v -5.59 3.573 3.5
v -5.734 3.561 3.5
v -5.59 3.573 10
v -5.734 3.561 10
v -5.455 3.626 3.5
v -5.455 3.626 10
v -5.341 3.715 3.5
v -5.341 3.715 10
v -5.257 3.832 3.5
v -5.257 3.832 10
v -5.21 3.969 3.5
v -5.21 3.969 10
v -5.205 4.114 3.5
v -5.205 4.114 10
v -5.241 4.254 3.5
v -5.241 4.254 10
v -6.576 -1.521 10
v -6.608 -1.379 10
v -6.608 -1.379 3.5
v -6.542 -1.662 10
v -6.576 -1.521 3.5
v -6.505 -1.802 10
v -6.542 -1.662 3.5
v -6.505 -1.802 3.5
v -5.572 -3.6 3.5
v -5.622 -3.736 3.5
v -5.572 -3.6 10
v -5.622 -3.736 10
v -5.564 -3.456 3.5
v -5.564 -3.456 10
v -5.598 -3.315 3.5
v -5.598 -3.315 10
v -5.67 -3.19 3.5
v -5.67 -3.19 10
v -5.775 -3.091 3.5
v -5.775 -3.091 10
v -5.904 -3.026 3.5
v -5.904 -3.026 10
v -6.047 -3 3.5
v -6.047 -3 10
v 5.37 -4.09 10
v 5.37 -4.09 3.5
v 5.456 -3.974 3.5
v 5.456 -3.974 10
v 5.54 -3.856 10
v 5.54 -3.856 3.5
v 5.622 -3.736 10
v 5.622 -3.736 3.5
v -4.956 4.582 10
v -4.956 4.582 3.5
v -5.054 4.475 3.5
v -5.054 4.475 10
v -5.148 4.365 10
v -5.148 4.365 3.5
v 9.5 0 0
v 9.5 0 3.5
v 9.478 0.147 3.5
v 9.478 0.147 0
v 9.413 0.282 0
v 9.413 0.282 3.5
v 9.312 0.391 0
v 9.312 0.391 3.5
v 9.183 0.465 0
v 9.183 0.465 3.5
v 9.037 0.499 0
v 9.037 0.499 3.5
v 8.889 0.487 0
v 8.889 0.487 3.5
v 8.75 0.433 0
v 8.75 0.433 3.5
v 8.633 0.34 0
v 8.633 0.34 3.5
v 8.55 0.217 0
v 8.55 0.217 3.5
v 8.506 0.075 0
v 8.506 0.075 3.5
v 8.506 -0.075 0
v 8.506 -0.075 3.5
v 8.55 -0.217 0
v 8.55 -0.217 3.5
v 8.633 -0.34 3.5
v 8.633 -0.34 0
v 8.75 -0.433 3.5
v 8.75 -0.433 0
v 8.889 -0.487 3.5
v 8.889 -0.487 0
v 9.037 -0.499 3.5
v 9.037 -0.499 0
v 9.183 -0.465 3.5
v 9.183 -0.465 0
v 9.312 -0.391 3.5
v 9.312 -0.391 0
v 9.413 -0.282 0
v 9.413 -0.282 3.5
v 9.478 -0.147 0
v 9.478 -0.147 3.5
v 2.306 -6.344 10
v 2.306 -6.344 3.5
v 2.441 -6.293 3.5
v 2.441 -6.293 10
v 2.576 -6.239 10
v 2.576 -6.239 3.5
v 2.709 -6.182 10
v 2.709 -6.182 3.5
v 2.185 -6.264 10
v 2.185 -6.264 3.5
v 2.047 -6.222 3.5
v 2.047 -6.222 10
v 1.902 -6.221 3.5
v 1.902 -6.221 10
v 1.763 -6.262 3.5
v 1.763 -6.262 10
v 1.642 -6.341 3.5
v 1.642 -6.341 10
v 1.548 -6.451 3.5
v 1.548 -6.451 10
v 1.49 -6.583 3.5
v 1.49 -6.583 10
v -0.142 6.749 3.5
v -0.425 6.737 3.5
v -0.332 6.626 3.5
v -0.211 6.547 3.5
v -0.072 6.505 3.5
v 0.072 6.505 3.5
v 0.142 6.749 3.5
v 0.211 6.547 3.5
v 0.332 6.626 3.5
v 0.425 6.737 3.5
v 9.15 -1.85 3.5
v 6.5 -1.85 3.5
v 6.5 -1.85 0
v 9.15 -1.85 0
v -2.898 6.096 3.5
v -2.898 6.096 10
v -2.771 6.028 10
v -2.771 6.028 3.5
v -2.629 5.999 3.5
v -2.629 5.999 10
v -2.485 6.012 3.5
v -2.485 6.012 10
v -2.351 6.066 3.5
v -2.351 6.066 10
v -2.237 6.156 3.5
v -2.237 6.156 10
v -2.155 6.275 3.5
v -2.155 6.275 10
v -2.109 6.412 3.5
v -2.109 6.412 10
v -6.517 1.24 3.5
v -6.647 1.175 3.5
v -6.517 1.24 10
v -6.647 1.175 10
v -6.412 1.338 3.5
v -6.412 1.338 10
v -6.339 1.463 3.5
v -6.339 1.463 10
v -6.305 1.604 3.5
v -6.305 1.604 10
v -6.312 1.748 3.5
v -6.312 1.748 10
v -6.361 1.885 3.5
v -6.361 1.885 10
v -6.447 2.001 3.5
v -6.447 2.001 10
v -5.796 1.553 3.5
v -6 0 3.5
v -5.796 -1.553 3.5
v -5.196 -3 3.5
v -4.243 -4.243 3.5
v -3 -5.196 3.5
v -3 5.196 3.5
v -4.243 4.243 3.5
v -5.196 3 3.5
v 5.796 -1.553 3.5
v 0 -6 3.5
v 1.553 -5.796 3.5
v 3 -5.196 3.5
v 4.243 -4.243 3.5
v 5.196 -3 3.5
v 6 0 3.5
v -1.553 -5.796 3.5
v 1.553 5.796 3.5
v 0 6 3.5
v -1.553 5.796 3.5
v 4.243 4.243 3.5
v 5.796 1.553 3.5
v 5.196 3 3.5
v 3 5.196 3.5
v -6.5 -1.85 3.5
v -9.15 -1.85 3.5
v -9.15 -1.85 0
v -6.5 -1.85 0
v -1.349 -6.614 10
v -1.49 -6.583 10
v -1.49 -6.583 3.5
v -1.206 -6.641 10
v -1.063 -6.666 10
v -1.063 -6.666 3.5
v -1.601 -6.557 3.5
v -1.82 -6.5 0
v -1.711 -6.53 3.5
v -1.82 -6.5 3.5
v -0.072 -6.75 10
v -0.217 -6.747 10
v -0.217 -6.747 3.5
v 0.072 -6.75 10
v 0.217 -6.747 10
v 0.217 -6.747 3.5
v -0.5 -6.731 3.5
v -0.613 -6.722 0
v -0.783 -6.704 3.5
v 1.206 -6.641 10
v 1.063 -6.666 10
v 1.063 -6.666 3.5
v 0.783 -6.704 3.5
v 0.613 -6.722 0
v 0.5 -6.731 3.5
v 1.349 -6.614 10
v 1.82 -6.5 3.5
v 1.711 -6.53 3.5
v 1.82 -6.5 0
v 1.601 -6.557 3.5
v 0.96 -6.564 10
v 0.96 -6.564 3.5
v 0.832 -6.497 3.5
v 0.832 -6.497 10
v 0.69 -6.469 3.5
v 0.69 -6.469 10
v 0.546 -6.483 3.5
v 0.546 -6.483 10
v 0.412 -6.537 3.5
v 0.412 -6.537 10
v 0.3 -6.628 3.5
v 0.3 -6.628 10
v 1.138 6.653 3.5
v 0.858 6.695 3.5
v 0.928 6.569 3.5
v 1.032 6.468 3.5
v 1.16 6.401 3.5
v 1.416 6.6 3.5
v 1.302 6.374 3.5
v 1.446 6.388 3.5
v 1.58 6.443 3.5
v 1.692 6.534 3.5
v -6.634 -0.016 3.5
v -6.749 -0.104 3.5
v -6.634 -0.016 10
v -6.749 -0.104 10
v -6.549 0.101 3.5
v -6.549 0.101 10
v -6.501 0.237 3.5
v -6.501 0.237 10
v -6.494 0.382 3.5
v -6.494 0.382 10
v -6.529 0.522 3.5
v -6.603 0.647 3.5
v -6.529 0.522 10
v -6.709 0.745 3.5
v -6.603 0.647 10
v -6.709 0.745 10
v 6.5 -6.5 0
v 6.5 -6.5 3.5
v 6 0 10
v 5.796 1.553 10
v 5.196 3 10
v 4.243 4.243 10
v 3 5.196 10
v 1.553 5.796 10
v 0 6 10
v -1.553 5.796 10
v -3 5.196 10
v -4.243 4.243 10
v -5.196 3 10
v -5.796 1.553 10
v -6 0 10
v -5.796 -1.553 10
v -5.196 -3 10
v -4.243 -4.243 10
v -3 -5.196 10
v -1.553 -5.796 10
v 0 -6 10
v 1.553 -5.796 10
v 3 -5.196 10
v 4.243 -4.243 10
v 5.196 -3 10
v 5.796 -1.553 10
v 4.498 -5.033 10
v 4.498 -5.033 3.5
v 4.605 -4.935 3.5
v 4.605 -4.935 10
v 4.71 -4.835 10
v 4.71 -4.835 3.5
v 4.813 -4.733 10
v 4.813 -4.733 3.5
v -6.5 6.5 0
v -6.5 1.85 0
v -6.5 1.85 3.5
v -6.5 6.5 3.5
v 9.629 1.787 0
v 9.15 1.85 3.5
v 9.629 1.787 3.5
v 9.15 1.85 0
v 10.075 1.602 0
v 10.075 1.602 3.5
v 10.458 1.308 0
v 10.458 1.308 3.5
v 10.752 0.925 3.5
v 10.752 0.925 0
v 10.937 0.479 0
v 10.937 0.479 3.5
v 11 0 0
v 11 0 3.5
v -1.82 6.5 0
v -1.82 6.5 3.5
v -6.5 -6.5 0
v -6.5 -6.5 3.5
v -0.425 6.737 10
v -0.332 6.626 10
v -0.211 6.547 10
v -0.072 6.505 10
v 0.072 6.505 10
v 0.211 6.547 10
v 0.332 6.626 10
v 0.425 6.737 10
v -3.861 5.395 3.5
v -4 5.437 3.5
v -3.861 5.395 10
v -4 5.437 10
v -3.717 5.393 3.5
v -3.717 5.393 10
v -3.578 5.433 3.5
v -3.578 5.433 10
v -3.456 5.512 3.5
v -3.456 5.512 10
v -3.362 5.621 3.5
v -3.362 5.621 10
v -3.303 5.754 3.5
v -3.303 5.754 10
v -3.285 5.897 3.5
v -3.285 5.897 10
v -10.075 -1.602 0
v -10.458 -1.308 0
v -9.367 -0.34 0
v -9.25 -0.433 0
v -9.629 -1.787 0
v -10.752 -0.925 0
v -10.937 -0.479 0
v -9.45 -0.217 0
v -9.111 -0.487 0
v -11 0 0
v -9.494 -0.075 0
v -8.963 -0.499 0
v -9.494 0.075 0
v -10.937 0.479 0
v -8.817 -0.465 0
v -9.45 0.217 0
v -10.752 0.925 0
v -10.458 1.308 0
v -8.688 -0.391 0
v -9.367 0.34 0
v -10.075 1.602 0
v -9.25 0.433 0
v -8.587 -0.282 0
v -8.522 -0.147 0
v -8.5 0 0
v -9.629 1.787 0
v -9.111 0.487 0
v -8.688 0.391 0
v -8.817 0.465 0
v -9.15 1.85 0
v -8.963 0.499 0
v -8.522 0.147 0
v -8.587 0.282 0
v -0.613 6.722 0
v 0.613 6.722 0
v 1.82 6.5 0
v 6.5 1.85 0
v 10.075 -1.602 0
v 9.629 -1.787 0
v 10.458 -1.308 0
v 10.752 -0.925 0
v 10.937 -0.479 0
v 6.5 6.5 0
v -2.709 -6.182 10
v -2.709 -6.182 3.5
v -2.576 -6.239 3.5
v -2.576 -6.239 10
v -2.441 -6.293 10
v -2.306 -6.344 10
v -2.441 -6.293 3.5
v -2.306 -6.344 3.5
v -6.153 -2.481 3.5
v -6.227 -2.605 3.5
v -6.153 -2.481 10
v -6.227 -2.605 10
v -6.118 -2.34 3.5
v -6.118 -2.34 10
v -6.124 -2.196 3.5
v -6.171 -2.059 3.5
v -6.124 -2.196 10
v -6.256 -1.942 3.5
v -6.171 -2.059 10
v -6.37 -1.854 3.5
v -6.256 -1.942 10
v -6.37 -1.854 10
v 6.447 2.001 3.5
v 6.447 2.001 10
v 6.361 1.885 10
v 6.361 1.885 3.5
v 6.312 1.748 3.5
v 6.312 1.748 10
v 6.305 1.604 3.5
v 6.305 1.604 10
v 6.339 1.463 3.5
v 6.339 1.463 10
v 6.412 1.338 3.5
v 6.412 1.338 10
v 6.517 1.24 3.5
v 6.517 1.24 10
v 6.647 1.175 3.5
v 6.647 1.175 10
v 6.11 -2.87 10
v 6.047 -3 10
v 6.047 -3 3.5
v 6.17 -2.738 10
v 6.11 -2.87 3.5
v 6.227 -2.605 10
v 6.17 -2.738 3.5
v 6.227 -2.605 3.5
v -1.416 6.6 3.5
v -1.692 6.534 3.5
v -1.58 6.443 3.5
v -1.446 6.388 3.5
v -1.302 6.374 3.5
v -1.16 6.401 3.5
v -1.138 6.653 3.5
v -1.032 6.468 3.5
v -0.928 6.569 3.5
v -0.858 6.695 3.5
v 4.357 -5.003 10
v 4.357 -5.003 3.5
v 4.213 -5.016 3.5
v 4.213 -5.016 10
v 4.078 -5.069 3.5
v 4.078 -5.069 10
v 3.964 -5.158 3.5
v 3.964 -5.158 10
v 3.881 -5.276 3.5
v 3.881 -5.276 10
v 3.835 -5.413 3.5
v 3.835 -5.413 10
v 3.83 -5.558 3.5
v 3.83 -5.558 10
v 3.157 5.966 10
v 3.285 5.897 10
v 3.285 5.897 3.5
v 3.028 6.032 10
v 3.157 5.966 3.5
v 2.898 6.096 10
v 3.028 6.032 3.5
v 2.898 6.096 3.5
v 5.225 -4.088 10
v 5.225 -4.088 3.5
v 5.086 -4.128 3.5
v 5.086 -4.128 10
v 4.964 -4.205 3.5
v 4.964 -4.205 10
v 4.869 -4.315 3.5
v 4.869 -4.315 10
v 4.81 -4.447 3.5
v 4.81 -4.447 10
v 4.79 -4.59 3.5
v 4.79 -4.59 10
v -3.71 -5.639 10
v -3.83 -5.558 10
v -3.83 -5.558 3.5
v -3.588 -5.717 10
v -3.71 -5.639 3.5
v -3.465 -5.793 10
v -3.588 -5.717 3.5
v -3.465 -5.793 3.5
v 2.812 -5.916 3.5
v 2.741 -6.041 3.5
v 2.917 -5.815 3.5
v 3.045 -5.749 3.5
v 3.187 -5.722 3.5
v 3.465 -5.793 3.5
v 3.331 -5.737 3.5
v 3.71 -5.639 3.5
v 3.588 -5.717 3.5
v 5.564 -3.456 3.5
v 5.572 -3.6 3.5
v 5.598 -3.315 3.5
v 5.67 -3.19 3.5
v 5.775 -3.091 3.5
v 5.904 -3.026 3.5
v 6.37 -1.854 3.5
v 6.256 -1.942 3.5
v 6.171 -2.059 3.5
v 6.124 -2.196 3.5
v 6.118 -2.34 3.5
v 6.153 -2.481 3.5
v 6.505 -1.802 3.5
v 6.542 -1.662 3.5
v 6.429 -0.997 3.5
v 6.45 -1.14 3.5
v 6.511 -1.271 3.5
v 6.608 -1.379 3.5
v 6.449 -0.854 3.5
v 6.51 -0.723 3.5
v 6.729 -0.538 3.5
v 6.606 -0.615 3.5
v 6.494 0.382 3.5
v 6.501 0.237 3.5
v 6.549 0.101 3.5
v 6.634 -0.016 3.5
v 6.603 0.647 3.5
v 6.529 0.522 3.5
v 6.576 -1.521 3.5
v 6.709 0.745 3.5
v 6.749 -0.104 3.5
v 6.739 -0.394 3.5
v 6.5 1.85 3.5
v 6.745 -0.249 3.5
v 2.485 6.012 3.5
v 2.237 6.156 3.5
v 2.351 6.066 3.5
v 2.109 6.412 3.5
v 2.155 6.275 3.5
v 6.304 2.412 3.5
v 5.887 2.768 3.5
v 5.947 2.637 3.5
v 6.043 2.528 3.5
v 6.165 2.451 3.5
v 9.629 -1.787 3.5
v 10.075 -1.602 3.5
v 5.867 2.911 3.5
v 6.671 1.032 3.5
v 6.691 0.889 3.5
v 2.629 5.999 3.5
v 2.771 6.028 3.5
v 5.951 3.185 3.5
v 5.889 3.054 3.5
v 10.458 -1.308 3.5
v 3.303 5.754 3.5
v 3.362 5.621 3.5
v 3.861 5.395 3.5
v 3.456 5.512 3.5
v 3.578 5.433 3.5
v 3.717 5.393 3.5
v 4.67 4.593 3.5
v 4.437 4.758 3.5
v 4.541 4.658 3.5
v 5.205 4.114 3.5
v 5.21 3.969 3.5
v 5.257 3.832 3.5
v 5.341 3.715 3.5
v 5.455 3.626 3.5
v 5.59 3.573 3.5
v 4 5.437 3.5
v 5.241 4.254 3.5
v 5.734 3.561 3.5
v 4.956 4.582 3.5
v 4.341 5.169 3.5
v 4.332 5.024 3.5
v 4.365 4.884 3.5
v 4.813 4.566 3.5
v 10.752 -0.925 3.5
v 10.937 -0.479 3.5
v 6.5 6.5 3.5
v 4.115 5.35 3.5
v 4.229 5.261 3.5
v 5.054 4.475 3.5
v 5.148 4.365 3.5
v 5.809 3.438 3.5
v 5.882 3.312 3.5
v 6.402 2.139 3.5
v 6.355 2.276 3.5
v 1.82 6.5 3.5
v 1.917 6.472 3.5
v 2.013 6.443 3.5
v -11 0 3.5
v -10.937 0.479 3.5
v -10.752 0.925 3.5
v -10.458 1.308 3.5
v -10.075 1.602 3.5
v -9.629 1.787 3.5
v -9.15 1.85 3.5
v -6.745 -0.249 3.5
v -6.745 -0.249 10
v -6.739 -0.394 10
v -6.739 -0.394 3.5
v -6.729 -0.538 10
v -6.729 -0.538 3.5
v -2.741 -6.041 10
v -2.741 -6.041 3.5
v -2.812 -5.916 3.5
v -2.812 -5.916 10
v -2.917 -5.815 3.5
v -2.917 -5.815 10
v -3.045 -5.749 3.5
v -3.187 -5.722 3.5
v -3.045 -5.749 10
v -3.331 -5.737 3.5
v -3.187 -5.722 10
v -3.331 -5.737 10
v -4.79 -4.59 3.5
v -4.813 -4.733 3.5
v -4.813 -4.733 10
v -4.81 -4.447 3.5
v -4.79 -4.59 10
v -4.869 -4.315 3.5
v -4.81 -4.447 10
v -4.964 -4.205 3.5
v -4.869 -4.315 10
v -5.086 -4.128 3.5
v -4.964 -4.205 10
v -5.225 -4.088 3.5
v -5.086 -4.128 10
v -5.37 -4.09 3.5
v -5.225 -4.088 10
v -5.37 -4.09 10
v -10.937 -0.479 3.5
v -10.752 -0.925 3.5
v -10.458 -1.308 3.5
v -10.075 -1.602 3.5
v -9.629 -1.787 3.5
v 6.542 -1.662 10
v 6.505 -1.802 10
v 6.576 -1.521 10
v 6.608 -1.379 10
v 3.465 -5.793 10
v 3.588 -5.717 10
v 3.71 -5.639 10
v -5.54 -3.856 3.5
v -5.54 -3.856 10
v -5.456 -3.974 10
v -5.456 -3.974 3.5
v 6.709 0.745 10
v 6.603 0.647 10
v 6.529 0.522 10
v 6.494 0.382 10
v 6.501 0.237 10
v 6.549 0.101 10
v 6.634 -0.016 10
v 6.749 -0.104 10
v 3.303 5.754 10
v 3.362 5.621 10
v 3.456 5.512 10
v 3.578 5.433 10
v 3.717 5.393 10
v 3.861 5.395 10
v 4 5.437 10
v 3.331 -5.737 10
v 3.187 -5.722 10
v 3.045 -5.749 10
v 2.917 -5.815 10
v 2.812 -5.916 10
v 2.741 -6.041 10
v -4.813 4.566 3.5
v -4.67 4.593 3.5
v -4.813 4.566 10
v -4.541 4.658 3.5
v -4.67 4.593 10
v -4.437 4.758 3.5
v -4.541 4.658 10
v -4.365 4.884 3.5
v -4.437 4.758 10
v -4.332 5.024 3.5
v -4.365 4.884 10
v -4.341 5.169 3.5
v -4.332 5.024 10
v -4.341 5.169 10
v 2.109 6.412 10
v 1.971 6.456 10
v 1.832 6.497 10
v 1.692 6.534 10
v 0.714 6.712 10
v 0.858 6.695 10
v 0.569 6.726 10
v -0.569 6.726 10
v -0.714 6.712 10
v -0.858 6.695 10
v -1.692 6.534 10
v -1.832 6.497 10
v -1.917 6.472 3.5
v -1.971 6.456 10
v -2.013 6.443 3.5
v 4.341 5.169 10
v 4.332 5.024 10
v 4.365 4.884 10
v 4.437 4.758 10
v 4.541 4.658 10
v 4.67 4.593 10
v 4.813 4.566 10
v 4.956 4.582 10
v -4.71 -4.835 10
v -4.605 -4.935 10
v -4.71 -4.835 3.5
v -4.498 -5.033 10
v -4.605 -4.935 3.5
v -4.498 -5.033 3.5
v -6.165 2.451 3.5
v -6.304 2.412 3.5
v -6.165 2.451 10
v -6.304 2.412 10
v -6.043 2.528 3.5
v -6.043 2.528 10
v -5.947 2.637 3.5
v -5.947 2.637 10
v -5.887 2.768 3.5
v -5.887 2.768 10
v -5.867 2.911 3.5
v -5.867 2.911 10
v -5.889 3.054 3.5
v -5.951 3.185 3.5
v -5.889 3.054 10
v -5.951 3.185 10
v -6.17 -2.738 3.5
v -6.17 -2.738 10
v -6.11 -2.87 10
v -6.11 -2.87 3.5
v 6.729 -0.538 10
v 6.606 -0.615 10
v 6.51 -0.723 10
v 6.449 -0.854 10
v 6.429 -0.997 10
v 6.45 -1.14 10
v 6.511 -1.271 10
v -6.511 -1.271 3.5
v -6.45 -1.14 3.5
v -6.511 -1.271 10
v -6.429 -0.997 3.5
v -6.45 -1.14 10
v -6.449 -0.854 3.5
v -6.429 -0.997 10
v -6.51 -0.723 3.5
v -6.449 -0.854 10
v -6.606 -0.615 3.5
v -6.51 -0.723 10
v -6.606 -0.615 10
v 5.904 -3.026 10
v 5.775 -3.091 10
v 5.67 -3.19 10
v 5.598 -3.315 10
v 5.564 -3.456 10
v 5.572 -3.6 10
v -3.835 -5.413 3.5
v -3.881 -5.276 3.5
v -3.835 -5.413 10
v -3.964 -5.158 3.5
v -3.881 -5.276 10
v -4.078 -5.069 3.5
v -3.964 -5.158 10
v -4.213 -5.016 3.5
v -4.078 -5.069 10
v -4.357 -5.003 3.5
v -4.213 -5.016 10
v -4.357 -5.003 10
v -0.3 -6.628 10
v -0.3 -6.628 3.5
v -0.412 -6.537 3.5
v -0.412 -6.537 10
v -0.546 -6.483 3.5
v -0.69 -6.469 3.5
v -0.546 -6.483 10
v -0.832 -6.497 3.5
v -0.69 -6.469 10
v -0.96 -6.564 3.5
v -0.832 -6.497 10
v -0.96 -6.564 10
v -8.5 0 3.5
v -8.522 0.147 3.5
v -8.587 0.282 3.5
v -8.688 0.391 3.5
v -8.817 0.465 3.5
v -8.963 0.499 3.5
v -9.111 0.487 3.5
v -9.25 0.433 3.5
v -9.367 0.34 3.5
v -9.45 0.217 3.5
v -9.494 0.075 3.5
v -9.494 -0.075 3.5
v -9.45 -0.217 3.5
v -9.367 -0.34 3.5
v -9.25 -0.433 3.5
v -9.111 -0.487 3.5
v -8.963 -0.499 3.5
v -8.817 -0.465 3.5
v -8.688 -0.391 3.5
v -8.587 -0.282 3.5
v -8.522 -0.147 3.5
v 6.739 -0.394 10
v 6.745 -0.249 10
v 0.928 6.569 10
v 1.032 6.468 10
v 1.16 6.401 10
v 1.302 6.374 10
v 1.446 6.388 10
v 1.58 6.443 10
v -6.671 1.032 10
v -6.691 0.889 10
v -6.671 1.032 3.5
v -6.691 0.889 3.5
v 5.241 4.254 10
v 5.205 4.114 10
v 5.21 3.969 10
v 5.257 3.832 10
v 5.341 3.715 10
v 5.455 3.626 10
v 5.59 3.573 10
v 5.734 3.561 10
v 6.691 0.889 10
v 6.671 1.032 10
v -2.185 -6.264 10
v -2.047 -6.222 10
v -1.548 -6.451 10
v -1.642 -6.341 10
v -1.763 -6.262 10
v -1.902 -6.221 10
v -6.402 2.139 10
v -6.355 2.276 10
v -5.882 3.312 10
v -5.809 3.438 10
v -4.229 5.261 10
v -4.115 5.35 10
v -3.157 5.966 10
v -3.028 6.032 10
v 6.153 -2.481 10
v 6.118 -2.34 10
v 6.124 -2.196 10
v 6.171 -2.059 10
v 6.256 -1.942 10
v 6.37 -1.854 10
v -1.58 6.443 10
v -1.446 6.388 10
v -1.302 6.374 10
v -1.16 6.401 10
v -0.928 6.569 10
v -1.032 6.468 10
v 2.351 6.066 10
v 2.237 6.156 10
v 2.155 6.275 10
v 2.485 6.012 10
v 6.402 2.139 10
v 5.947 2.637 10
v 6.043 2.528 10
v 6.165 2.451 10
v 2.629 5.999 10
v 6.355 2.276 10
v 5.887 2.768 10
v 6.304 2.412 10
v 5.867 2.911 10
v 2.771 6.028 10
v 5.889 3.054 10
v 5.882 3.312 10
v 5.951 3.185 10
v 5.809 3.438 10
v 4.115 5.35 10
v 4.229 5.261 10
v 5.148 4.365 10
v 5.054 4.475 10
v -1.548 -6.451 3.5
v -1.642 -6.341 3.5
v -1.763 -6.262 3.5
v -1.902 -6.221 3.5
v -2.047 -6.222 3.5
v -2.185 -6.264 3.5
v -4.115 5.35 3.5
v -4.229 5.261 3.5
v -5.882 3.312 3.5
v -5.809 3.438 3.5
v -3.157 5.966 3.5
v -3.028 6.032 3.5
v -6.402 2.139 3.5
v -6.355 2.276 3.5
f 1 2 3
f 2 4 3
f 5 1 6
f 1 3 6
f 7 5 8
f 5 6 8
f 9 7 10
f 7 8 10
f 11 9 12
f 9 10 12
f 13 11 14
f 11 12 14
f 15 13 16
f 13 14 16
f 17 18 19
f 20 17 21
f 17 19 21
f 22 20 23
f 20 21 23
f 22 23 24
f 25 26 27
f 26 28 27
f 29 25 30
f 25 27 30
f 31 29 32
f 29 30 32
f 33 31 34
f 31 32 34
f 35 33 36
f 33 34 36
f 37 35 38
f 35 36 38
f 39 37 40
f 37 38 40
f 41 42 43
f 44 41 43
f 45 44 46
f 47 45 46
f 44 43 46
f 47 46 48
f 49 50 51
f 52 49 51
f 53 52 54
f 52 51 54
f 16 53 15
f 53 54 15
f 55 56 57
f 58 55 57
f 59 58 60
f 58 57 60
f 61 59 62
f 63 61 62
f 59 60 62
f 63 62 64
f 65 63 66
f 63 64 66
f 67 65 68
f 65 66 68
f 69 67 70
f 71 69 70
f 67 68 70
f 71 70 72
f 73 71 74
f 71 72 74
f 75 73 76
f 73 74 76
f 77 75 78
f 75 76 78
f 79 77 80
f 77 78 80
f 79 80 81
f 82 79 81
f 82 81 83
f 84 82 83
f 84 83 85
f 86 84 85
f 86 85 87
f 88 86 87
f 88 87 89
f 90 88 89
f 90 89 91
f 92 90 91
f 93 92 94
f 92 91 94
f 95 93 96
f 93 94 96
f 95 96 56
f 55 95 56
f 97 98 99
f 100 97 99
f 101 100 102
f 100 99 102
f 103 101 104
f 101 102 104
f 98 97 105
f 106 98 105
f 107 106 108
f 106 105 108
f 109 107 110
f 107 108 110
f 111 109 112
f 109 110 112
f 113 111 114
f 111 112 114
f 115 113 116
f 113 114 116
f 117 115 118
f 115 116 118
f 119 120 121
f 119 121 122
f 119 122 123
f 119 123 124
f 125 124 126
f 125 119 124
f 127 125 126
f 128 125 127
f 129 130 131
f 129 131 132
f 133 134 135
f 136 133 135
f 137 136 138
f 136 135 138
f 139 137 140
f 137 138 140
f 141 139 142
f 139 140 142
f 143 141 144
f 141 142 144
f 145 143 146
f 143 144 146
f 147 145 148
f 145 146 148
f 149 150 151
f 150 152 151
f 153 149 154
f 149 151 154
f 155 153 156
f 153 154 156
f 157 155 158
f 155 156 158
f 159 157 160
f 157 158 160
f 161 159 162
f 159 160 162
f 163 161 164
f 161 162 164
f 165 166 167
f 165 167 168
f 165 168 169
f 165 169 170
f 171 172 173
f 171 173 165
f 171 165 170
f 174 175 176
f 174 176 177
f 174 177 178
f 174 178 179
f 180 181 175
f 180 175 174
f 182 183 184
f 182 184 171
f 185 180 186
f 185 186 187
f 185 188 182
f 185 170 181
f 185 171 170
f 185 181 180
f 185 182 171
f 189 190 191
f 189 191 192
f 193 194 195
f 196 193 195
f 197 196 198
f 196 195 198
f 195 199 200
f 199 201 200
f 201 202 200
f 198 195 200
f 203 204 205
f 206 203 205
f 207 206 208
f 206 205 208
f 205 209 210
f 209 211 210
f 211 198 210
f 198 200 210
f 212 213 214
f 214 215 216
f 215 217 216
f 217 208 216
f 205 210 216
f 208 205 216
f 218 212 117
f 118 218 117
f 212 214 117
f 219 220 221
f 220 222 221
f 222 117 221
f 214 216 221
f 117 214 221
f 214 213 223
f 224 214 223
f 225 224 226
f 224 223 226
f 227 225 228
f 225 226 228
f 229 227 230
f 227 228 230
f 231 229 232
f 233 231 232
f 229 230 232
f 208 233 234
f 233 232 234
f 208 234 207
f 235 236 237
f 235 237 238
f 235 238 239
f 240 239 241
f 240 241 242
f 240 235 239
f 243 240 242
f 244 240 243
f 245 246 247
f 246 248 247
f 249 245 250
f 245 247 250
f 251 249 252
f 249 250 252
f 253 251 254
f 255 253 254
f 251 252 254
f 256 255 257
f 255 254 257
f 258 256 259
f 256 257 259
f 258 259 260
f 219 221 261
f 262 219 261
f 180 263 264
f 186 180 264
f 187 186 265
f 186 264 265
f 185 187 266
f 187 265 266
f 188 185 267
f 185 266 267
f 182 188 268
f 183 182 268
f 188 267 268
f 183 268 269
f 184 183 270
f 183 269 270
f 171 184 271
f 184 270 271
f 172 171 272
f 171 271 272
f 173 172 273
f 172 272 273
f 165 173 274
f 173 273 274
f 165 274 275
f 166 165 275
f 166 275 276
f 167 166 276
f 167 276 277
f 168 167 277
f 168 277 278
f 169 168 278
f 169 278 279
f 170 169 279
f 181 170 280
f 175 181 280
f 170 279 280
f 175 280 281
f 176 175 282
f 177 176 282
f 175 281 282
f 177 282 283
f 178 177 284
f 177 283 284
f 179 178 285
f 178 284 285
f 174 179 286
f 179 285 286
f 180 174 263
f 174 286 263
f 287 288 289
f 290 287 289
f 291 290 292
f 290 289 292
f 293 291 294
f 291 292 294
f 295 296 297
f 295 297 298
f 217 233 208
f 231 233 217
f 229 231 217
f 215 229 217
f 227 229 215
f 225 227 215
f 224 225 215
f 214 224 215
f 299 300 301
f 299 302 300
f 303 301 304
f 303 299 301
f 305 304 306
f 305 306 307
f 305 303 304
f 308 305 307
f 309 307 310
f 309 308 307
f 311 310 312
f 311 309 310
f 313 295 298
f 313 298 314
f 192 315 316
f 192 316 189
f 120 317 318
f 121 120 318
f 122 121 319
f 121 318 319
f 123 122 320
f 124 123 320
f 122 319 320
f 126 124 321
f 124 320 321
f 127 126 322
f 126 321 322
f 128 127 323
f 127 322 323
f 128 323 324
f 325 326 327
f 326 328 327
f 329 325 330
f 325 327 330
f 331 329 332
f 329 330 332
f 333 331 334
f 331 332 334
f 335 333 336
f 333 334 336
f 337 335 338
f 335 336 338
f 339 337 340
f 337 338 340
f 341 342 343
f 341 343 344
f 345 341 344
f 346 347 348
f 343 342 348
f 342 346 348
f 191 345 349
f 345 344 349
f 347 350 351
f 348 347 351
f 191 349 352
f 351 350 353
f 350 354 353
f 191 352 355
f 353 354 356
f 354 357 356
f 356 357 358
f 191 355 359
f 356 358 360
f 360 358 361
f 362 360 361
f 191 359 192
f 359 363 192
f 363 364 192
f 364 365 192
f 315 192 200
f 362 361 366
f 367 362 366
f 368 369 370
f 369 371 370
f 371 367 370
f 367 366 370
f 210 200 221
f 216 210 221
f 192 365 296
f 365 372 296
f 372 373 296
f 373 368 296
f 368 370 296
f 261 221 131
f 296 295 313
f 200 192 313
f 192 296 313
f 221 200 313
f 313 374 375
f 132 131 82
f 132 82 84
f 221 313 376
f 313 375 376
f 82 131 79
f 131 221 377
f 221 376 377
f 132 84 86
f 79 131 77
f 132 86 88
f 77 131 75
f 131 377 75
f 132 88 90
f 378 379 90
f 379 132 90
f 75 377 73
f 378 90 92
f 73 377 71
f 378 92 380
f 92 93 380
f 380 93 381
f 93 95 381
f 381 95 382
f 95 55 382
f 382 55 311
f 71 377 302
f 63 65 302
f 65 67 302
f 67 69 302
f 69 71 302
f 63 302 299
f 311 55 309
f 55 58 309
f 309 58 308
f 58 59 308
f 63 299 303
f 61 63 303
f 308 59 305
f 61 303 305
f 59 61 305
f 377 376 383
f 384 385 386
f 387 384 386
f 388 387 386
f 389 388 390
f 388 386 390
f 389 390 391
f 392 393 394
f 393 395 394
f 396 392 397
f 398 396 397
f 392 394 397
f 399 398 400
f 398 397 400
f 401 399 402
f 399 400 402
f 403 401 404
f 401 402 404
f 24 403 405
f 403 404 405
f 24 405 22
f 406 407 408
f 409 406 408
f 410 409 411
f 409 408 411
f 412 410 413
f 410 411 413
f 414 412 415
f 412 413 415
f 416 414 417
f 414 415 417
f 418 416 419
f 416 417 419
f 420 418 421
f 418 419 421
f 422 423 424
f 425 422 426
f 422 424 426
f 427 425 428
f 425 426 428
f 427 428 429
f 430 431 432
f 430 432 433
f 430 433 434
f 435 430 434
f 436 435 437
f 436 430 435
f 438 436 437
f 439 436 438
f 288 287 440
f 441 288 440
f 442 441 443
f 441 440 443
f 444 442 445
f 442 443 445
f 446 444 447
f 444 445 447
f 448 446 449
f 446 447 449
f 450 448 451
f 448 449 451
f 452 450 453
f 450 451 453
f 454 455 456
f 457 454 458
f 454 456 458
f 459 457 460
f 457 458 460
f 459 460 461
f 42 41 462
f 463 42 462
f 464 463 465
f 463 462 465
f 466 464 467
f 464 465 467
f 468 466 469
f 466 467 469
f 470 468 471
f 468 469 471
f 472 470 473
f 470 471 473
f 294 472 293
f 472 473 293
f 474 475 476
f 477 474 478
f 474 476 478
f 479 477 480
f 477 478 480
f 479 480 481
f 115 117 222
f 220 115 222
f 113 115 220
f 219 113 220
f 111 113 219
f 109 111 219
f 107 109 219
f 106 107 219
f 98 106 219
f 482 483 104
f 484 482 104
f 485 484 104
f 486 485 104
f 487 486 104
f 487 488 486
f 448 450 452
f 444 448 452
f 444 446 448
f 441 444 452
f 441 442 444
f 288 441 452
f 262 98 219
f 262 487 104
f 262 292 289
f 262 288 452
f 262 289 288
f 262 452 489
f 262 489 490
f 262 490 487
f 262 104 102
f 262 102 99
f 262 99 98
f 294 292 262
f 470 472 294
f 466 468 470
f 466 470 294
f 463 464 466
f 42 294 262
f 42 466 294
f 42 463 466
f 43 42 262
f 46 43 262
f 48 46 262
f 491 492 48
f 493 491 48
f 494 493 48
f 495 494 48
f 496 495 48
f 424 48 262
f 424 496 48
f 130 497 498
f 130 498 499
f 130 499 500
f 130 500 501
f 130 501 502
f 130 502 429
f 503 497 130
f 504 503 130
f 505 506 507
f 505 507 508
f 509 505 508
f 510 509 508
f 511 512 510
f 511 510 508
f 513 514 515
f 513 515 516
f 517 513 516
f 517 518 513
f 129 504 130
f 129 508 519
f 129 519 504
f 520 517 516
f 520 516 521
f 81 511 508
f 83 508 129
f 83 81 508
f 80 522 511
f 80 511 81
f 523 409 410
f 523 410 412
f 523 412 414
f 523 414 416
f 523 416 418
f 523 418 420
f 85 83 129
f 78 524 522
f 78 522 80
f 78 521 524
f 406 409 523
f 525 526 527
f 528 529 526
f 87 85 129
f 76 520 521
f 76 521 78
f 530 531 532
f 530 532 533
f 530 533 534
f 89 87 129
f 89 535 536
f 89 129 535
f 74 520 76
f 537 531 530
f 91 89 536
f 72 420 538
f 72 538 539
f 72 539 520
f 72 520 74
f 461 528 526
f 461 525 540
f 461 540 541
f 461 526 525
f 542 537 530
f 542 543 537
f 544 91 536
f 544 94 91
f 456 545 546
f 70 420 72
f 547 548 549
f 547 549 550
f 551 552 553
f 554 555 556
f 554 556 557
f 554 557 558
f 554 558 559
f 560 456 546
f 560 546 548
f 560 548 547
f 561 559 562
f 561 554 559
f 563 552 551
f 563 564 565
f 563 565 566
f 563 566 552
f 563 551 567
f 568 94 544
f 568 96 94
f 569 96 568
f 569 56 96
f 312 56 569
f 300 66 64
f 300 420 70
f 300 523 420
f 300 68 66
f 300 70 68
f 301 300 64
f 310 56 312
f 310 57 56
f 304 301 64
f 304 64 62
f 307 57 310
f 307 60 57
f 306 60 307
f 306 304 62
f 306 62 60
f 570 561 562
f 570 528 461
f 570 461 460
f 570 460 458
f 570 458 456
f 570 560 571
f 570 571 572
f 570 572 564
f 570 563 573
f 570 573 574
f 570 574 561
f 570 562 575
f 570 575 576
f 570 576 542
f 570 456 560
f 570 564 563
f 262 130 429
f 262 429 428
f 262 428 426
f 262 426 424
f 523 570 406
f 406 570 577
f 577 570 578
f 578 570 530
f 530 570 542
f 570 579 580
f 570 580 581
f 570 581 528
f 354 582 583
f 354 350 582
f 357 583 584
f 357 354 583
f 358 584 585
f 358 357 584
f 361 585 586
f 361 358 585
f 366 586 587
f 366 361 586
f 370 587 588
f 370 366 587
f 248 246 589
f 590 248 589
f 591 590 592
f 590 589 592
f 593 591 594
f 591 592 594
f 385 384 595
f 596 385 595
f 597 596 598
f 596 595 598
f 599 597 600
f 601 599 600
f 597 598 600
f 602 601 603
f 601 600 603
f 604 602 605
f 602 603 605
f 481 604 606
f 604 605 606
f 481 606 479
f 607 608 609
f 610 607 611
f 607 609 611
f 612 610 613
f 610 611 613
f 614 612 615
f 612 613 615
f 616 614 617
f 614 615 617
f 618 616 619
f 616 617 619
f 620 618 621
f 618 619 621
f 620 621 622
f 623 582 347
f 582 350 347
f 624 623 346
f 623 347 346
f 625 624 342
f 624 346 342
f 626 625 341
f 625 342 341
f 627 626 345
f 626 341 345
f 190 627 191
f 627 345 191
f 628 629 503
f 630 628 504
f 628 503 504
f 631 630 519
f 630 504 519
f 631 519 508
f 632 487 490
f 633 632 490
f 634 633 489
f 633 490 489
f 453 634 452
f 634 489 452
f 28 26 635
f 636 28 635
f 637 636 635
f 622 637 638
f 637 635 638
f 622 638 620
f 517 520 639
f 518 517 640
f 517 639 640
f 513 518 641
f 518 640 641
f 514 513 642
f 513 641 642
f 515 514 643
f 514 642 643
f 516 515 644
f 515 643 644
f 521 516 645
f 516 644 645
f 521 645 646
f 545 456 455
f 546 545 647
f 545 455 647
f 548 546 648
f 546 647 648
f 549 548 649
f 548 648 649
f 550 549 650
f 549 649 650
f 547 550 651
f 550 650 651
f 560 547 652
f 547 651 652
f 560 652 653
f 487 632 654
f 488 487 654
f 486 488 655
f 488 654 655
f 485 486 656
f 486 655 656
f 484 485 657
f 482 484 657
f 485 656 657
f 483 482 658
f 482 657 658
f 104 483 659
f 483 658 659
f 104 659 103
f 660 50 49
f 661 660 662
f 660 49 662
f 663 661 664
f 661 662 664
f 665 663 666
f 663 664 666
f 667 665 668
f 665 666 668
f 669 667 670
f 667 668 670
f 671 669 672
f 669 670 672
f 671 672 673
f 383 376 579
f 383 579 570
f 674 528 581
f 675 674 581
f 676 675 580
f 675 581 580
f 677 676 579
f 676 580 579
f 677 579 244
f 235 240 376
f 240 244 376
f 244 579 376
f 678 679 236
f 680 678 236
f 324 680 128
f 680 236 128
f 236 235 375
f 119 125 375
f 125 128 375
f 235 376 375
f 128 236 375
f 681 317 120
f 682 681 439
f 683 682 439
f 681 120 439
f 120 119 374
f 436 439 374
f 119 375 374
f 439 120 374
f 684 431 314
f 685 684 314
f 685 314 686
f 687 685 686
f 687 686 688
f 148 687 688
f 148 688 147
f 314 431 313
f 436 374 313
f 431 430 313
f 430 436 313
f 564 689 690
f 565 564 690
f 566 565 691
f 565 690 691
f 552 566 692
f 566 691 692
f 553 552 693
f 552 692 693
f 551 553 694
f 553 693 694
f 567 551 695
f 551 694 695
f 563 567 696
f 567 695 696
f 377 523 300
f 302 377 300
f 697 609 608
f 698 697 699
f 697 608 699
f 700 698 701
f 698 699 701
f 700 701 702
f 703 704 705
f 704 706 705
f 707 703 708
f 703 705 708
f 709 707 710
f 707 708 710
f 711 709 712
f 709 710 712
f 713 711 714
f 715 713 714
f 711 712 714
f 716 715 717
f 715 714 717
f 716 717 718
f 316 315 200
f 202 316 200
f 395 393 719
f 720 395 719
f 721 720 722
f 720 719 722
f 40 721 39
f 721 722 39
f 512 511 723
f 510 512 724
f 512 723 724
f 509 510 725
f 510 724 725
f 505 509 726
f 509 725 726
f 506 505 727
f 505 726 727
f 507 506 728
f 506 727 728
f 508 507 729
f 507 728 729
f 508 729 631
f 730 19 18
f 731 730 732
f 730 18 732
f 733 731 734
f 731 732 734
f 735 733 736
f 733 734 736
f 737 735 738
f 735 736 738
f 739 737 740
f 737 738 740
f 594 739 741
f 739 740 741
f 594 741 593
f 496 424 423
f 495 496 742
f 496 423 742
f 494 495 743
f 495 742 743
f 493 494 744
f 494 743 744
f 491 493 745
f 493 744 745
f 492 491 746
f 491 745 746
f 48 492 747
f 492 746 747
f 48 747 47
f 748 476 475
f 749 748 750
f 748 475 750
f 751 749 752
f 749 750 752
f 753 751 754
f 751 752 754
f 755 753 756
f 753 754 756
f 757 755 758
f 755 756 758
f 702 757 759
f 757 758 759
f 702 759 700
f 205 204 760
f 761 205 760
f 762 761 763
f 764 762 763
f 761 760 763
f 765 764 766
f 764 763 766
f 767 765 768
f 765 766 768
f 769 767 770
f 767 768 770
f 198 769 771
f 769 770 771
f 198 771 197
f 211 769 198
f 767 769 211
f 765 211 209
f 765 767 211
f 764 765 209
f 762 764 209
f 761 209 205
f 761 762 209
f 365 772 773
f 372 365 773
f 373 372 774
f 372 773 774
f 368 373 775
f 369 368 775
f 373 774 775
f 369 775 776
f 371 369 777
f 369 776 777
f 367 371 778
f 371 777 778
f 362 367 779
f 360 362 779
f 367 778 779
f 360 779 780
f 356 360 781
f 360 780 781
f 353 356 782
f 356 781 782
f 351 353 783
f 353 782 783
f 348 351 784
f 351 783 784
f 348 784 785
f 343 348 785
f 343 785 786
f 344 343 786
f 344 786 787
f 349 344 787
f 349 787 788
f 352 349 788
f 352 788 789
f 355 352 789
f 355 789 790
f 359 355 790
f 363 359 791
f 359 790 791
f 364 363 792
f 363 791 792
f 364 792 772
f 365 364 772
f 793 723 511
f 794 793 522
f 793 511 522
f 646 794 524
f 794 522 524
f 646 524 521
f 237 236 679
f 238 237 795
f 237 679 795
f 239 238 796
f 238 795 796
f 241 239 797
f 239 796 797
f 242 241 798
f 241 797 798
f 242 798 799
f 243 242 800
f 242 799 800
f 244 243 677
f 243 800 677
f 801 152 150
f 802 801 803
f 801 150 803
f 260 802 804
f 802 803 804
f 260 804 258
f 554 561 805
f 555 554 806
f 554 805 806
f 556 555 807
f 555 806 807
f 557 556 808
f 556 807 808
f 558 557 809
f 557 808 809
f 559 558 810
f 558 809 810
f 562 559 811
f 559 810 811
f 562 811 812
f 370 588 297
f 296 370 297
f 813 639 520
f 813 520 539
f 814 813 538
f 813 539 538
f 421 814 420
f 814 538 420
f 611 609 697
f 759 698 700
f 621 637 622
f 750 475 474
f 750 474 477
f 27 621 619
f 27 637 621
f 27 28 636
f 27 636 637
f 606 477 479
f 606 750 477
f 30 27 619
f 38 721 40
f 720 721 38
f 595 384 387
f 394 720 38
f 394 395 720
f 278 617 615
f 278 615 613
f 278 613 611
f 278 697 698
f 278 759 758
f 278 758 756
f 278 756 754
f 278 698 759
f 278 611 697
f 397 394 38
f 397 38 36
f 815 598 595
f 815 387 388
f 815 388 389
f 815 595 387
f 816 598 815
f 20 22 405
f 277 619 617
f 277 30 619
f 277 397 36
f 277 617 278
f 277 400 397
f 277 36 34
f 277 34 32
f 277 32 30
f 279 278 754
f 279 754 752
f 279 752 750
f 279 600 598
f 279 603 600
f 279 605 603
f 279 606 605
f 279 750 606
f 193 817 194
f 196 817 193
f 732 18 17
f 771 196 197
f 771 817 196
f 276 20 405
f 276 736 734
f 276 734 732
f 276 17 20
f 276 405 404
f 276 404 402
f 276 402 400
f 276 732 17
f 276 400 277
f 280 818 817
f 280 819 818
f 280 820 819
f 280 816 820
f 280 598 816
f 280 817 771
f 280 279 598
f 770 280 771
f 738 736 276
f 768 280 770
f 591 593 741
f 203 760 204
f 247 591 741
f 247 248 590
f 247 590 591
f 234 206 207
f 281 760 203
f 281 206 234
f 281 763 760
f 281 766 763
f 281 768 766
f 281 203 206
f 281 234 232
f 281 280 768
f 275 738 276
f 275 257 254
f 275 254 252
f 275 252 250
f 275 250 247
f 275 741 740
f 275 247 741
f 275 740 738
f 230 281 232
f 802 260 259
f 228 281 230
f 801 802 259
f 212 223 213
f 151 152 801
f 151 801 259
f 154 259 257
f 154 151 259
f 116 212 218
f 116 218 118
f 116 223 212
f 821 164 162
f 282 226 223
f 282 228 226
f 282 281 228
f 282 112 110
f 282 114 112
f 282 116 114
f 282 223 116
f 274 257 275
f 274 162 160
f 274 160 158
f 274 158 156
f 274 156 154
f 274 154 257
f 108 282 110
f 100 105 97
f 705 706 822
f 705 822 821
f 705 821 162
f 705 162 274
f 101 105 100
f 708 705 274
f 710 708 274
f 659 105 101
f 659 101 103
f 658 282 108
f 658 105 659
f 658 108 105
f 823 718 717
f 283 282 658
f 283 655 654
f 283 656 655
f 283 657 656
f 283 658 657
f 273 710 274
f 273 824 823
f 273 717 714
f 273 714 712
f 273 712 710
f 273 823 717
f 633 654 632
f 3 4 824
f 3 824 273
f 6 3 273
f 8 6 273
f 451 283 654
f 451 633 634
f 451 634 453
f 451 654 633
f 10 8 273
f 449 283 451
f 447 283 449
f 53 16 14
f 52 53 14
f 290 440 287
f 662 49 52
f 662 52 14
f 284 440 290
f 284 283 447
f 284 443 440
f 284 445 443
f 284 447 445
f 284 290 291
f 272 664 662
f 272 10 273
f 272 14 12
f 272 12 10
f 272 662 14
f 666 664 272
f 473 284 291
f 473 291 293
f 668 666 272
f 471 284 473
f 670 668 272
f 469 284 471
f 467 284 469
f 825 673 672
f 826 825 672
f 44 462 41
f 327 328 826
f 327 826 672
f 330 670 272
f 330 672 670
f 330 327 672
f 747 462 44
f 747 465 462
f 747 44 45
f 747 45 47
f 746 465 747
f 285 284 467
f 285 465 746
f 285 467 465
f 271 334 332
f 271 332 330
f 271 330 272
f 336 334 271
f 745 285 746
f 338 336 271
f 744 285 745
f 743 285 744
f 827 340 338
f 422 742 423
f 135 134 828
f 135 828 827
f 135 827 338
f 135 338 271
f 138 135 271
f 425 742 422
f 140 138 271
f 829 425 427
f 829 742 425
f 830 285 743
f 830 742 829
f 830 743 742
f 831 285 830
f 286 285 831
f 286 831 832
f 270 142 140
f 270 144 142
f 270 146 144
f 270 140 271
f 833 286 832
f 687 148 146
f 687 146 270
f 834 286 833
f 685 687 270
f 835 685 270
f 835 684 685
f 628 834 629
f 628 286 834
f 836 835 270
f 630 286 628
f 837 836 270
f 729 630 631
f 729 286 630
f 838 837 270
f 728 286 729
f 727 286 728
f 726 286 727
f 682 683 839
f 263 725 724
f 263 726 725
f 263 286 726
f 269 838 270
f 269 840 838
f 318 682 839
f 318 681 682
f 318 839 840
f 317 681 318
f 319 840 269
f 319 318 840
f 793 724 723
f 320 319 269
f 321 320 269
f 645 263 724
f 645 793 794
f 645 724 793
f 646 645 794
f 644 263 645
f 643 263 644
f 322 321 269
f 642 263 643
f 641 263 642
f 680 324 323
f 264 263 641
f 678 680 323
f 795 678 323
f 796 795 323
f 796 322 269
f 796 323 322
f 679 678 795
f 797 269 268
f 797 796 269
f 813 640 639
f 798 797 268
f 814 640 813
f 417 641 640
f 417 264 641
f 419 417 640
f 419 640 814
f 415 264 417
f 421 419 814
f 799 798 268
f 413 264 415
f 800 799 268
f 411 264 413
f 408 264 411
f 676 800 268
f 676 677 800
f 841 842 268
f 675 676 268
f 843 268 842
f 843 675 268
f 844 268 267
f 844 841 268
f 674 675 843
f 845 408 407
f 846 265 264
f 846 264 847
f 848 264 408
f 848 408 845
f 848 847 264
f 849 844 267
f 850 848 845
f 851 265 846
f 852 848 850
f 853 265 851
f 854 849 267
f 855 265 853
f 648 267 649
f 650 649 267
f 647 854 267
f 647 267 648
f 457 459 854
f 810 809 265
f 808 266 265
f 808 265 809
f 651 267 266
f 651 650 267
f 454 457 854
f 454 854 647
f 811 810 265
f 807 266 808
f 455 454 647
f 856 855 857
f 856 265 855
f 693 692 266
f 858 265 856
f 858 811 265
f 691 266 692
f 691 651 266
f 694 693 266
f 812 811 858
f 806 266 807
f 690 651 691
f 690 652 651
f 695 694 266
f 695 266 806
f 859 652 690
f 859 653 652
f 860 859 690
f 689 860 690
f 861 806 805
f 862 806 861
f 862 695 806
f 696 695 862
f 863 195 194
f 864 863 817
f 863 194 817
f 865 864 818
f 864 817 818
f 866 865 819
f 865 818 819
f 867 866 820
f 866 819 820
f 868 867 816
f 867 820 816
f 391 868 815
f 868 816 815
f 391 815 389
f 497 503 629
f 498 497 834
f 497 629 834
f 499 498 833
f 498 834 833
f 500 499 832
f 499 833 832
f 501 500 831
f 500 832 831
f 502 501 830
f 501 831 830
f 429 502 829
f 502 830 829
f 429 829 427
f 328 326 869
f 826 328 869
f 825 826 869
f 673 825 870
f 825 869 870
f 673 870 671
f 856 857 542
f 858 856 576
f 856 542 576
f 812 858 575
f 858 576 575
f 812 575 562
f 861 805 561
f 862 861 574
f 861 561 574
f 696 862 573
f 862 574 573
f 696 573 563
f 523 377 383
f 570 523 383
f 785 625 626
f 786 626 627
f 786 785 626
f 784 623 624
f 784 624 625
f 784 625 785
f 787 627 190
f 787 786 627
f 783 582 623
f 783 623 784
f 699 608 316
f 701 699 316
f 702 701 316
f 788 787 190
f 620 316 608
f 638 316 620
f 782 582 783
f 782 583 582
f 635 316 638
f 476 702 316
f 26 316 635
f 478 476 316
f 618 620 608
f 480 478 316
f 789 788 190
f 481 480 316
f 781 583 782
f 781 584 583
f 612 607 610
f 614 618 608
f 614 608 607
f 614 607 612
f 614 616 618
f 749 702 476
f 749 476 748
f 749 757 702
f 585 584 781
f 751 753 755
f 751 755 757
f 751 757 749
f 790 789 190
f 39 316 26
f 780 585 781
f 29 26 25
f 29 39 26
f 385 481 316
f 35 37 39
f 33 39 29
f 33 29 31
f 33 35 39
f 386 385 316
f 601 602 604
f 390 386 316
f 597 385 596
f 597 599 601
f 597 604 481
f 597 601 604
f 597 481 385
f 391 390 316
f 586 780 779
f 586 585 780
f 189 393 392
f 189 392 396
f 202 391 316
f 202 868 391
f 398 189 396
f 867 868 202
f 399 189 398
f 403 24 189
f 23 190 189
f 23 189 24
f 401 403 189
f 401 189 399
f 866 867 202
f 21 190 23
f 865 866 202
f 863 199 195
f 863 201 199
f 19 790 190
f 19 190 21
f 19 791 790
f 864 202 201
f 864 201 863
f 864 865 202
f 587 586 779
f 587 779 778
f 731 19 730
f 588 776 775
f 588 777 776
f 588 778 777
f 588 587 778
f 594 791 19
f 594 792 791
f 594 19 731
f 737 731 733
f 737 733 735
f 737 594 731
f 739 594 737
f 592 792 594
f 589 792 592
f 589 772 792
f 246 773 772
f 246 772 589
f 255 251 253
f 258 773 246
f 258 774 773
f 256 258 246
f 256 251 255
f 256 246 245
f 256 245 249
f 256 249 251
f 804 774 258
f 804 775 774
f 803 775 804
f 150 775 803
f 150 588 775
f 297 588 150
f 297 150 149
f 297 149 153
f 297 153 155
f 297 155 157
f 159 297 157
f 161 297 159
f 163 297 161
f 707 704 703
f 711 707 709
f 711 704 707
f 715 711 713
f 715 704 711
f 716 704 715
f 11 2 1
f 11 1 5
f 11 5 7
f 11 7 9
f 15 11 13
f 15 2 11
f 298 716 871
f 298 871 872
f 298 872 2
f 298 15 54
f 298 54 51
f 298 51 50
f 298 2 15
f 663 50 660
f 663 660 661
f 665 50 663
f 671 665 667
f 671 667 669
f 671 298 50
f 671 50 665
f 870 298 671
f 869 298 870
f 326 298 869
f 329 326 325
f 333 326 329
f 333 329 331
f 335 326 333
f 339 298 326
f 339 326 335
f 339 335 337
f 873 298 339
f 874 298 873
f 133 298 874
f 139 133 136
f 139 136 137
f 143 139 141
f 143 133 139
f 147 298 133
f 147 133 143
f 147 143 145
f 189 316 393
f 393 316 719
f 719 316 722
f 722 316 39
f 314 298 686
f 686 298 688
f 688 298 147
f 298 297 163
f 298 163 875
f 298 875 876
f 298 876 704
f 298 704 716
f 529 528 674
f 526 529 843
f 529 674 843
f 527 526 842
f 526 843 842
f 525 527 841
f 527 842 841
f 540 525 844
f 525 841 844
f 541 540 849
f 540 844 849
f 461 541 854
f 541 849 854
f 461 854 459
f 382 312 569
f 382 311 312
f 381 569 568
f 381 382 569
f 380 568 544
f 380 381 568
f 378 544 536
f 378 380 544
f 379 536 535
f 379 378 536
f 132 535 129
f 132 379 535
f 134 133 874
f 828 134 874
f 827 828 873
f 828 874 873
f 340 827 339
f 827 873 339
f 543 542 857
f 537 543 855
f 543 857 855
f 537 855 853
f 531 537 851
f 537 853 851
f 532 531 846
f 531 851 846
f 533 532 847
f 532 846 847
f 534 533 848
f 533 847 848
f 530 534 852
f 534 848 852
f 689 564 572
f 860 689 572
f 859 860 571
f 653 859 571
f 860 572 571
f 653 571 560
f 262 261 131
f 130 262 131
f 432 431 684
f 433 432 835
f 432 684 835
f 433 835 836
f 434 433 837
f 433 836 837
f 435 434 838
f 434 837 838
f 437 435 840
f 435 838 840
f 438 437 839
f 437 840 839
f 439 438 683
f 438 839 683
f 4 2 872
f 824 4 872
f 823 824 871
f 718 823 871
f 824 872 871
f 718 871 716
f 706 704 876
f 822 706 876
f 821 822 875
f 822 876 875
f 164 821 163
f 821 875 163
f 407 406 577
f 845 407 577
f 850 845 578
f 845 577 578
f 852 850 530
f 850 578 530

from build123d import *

# Parameters (mm, degrees)
SKETCH1_W                = 13
SKETCH1_H                = 13
BOSS_EXTRUDE1_DEPTH      = 3.5
SKETCH2_W                = 22
SKETCH2_H                = 3.7
BOSS_EXTRUDE2_DEPTH      = 3.5
FILLET1_R                = 1.85
SKETCH3_R                = 0.5
CUT_EXTRUDE1_DEPTH       = 3.5
BOSS_EXTRUDE3_DEPTH      = 6.5
BOSS_EXTRUDE3_DEPTH_BACK = 3.5
SKETCH4_R                = 6.75
SKETCH5_R                = 0.5
CUT_EXTRUDE2_DEPTH       = 6.5
SKETCH6_R                = 6
CUT_EXTRUDE3_DEPTH       = 6.5


with BuildPart() as part:
    # Sketch1 → Boss-Extrude1 (new body)
    with BuildSketch(Plane.XY):
        Rectangle(SKETCH1_W, SKETCH1_H)
    extrude(amount=BOSS_EXTRUDE1_DEPTH)

    # Sketch2 → Boss-Extrude2 (add)
    with BuildSketch(Plane.XY.offset(3.5)):
        Rectangle(SKETCH2_W, SKETCH2_H)
    extrude(amount=-BOSS_EXTRUDE2_DEPTH)

    # Fillet1
    fillet1_edges = [part.edges().sort_by_distance(p)[0] for p in [
        (11, -1.85, 1.75),
        (11, 1.85, 1.75),
        (-11, -1.85, 1.75),
        (-11, 1.85, 1.75),
    ]]
    fillet(fillet1_edges, radius=FILLET1_R - 0.0001)  # a hair under: the kernel refuses the full size

    # Sketch3 → Cut-Extrude1 (cut)
    with BuildSketch(Plane.XY.offset(3.5)):
        with Locations((-9, 0)):
            Circle(SKETCH3_R)
        with Locations((9, 0)):
            Circle(SKETCH3_R)
    extrude(amount=-CUT_EXTRUDE1_DEPTH, mode=Mode.SUBTRACT)

    # Sketch4 → Boss-Extrude3 (add, two sides: drawn at the far end of the back side and taken through both)
    with BuildSketch(Plane.XY.offset(3.5).offset(-BOSS_EXTRUDE3_DEPTH_BACK)):
        Circle(SKETCH4_R)
    extrude(amount=BOSS_EXTRUDE3_DEPTH + BOSS_EXTRUDE3_DEPTH_BACK)

    # Sketch5 → Cut-Extrude2 (cut)
    with BuildSketch(Plane.XY.offset(10)):
        with Locations((0, 7)):
            Circle(SKETCH5_R)
        with Locations((1.324758711, 6.873500881)):
            Circle(SKETCH5_R)
        with Locations((2.60163719, 6.498575531)):
            Circle(SKETCH5_R)
        with Locations((3.784485722, 5.88877473)):
            Circle(SKETCH5_R)
        with Locations((4.83055308, 5.066138267)):
            Circle(SKETCH5_R)
        with Locations((5.702031664, 4.060398367)):
            Circle(SKETCH5_R)
        with Locations((6.367423967, 2.907905091)):
            Circle(SKETCH5_R)
        with Locations((6.802680978, 1.650312549)):
            Circle(SKETCH5_R)
        with Locations((6.992071374, 0.333073411)):
            Circle(SKETCH5_R)
        with Locations((6.928750093, -0.996203868)):
            Circle(SKETCH5_R)
        with Locations((6.615005731, -2.289475743)):
            Circle(SKETCH5_R)
        with Locations((6.062177826, -3.5)):
            Circle(SKETCH5_R)
        with Locations((5.29024702, -4.584025138)):
            Circle(SKETCH5_R)
        with Locations((4.327112904, -5.502371663)):
            Circle(SKETCH5_R)
        with Locations((3.207585652, -6.221848141)):
            Circle(SKETCH5_R)
        with Locations((1.972127898, -6.716450815)):
            Circle(SKETCH5_R)
        with Locations((0.665392303, -6.968303458)):
            Circle(SKETCH5_R)
        with Locations((-0.665392303, -6.968303458)):
            Circle(SKETCH5_R)
        with Locations((-1.972127898, -6.716450815)):
            Circle(SKETCH5_R)
        with Locations((-3.207585652, -6.221848141)):
            Circle(SKETCH5_R)
        with Locations((-4.327112904, -5.502371663)):
            Circle(SKETCH5_R)
        with Locations((-5.29024702, -4.584025138)):
            Circle(SKETCH5_R)
        with Locations((-6.062177826, -3.5)):
            Circle(SKETCH5_R)
        with Locations((-6.615005731, -2.289475743)):
            Circle(SKETCH5_R)
        with Locations((-6.928750093, -0.996203868)):
            Circle(SKETCH5_R)
        with Locations((-6.992071374, 0.333073411)):
            Circle(SKETCH5_R)
        with Locations((-6.802680978, 1.650312549)):
            Circle(SKETCH5_R)
        with Locations((-6.367423967, 2.907905091)):
            Circle(SKETCH5_R)
        with Locations((-5.702031664, 4.060398367)):
            Circle(SKETCH5_R)
        with Locations((-4.83055308, 5.066138267)):
            Circle(SKETCH5_R)
        with Locations((-3.784485722, 5.88877473)):
            Circle(SKETCH5_R)
        with Locations((-2.60163719, 6.498575531)):
            Circle(SKETCH5_R)
        with Locations((-1.324758711, 6.873500881)):
            Circle(SKETCH5_R)
    extrude(amount=-CUT_EXTRUDE2_DEPTH, mode=Mode.SUBTRACT)

    # Sketch6 → Cut-Extrude3 (cut)
    with BuildSketch(Plane.XY.offset(10)):
        Circle(SKETCH6_R)
    extrude(amount=-CUT_EXTRUDE3_DEPTH, mode=Mode.SUBTRACT)


solid = part.part
